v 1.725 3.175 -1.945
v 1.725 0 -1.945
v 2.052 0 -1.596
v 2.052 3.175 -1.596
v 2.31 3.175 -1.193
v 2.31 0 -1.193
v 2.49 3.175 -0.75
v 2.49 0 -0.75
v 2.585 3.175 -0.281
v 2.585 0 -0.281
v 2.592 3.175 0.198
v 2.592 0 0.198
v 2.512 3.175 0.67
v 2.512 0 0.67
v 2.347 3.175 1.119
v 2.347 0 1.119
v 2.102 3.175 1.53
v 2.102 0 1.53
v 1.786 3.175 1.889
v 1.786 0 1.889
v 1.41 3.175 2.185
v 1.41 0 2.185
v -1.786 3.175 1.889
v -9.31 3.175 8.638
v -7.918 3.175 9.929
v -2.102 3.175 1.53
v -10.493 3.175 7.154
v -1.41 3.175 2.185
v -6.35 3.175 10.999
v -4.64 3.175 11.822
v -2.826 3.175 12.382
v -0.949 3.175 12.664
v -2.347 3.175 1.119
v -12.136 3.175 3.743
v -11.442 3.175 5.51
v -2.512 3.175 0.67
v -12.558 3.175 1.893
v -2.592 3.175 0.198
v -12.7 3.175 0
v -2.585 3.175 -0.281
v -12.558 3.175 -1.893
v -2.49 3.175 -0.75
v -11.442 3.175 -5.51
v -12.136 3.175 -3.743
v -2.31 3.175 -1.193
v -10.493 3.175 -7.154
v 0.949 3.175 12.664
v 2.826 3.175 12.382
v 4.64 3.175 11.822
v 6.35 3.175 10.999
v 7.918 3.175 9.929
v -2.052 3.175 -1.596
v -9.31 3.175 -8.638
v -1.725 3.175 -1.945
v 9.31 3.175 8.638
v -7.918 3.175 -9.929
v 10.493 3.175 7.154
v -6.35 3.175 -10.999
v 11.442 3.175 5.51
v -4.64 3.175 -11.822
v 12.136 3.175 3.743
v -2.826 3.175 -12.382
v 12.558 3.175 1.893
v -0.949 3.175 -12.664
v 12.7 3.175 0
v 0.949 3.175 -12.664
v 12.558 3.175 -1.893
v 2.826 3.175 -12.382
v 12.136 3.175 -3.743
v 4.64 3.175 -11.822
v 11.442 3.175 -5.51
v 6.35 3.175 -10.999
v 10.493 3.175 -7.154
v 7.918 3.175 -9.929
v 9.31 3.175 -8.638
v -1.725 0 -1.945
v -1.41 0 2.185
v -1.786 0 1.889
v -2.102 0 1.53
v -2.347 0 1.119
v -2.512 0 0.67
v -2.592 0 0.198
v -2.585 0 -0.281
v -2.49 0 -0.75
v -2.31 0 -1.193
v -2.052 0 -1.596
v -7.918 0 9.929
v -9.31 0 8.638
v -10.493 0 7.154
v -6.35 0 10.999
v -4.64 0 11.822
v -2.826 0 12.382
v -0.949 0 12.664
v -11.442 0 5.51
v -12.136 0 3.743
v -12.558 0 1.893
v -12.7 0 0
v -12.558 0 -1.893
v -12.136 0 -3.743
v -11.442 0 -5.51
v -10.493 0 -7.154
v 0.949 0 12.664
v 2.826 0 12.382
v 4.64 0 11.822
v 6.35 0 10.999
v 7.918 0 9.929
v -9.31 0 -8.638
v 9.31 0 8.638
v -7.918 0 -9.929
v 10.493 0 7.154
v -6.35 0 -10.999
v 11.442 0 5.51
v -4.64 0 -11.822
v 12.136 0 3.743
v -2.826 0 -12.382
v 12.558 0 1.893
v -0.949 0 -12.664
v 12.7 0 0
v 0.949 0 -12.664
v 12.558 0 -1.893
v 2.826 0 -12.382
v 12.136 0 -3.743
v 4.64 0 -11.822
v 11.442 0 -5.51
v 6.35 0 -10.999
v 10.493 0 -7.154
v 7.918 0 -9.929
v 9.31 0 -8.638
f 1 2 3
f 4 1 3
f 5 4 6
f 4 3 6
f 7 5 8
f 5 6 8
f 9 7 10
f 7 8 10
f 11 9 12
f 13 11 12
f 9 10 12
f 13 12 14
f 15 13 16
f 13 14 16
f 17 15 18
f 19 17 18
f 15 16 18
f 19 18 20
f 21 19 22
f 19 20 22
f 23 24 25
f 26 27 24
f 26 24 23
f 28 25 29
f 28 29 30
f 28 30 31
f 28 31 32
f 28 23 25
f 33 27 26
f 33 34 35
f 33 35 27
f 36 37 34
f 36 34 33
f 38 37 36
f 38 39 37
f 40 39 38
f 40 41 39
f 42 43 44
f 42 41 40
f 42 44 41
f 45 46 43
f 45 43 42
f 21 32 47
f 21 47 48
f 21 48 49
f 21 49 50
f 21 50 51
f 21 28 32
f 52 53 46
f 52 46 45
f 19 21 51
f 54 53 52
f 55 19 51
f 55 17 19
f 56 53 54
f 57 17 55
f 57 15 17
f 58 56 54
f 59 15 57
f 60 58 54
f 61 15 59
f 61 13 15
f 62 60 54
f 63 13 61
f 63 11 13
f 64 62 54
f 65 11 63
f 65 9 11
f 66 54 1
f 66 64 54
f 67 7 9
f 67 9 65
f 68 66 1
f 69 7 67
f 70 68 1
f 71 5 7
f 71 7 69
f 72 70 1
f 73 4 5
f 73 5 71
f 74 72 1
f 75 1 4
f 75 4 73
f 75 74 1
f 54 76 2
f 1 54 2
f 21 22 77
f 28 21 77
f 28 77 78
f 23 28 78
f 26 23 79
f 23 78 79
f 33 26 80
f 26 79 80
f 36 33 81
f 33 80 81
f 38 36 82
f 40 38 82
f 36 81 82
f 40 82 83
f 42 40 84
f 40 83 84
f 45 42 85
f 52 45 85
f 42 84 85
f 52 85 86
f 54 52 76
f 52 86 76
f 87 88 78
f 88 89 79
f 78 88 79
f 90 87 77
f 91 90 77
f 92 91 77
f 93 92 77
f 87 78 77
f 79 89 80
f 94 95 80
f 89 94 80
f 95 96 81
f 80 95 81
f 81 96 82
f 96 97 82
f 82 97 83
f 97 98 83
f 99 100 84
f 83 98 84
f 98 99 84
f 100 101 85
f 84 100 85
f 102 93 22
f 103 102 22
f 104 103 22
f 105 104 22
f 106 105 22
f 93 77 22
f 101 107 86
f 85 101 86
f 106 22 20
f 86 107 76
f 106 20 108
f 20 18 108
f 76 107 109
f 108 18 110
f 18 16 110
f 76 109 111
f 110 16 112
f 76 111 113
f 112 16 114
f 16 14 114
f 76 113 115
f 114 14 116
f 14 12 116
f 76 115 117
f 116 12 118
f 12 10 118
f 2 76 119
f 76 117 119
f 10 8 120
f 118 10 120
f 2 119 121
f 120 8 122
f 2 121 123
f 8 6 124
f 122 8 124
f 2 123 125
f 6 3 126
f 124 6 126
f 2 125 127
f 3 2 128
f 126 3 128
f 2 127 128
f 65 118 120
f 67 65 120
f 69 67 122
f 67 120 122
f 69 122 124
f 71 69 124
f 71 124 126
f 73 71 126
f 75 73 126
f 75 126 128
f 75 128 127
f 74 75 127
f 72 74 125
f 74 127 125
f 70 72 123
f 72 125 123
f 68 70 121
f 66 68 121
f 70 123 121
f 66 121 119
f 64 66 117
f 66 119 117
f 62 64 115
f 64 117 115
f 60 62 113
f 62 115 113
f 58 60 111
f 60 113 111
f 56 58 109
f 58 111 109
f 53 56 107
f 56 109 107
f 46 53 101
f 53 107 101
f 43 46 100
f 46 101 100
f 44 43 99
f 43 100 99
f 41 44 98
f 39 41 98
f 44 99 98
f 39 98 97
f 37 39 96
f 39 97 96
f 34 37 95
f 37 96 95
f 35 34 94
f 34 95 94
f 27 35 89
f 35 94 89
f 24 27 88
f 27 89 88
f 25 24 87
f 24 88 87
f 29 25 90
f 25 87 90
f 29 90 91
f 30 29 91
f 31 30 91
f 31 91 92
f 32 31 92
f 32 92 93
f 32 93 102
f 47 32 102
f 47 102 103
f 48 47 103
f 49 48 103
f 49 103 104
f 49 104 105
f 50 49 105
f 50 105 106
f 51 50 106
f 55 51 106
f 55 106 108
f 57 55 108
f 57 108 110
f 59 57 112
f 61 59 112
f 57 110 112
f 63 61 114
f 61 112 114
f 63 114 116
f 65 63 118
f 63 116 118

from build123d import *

# Parameters (mm, degrees)
SKETCH1_R           = 12.7
BOSS_EXTRUDE1_DEPTH = 3.175


with BuildPart() as part:
    # Sketch1 → Boss-Extrude1 (new body)
    with BuildSketch(Plane(origin=(0, 0, 0), x_dir=(1, 0, 0), z_dir=(0, 1, 0))):
        Circle(SKETCH1_R)
        with BuildLine():
            Line((-1.725, 1.945347013), (1.725, 1.945347013))
            ThreePointArc((1.725, 1.945347013), (2.592456696, -0.197909772), (1.409713207, -2.184652987))
            Line((1.409713207, -2.184652987), (-1.409713207, -2.184652987))
            ThreePointArc((-1.409713207, -2.184652987), (-2.592456696, -0.197909772), (-1.725, 1.945347013))
        make_face(mode=Mode.SUBTRACT)
    extrude(amount=BOSS_EXTRUDE1_DEPTH)


solid = part.part
